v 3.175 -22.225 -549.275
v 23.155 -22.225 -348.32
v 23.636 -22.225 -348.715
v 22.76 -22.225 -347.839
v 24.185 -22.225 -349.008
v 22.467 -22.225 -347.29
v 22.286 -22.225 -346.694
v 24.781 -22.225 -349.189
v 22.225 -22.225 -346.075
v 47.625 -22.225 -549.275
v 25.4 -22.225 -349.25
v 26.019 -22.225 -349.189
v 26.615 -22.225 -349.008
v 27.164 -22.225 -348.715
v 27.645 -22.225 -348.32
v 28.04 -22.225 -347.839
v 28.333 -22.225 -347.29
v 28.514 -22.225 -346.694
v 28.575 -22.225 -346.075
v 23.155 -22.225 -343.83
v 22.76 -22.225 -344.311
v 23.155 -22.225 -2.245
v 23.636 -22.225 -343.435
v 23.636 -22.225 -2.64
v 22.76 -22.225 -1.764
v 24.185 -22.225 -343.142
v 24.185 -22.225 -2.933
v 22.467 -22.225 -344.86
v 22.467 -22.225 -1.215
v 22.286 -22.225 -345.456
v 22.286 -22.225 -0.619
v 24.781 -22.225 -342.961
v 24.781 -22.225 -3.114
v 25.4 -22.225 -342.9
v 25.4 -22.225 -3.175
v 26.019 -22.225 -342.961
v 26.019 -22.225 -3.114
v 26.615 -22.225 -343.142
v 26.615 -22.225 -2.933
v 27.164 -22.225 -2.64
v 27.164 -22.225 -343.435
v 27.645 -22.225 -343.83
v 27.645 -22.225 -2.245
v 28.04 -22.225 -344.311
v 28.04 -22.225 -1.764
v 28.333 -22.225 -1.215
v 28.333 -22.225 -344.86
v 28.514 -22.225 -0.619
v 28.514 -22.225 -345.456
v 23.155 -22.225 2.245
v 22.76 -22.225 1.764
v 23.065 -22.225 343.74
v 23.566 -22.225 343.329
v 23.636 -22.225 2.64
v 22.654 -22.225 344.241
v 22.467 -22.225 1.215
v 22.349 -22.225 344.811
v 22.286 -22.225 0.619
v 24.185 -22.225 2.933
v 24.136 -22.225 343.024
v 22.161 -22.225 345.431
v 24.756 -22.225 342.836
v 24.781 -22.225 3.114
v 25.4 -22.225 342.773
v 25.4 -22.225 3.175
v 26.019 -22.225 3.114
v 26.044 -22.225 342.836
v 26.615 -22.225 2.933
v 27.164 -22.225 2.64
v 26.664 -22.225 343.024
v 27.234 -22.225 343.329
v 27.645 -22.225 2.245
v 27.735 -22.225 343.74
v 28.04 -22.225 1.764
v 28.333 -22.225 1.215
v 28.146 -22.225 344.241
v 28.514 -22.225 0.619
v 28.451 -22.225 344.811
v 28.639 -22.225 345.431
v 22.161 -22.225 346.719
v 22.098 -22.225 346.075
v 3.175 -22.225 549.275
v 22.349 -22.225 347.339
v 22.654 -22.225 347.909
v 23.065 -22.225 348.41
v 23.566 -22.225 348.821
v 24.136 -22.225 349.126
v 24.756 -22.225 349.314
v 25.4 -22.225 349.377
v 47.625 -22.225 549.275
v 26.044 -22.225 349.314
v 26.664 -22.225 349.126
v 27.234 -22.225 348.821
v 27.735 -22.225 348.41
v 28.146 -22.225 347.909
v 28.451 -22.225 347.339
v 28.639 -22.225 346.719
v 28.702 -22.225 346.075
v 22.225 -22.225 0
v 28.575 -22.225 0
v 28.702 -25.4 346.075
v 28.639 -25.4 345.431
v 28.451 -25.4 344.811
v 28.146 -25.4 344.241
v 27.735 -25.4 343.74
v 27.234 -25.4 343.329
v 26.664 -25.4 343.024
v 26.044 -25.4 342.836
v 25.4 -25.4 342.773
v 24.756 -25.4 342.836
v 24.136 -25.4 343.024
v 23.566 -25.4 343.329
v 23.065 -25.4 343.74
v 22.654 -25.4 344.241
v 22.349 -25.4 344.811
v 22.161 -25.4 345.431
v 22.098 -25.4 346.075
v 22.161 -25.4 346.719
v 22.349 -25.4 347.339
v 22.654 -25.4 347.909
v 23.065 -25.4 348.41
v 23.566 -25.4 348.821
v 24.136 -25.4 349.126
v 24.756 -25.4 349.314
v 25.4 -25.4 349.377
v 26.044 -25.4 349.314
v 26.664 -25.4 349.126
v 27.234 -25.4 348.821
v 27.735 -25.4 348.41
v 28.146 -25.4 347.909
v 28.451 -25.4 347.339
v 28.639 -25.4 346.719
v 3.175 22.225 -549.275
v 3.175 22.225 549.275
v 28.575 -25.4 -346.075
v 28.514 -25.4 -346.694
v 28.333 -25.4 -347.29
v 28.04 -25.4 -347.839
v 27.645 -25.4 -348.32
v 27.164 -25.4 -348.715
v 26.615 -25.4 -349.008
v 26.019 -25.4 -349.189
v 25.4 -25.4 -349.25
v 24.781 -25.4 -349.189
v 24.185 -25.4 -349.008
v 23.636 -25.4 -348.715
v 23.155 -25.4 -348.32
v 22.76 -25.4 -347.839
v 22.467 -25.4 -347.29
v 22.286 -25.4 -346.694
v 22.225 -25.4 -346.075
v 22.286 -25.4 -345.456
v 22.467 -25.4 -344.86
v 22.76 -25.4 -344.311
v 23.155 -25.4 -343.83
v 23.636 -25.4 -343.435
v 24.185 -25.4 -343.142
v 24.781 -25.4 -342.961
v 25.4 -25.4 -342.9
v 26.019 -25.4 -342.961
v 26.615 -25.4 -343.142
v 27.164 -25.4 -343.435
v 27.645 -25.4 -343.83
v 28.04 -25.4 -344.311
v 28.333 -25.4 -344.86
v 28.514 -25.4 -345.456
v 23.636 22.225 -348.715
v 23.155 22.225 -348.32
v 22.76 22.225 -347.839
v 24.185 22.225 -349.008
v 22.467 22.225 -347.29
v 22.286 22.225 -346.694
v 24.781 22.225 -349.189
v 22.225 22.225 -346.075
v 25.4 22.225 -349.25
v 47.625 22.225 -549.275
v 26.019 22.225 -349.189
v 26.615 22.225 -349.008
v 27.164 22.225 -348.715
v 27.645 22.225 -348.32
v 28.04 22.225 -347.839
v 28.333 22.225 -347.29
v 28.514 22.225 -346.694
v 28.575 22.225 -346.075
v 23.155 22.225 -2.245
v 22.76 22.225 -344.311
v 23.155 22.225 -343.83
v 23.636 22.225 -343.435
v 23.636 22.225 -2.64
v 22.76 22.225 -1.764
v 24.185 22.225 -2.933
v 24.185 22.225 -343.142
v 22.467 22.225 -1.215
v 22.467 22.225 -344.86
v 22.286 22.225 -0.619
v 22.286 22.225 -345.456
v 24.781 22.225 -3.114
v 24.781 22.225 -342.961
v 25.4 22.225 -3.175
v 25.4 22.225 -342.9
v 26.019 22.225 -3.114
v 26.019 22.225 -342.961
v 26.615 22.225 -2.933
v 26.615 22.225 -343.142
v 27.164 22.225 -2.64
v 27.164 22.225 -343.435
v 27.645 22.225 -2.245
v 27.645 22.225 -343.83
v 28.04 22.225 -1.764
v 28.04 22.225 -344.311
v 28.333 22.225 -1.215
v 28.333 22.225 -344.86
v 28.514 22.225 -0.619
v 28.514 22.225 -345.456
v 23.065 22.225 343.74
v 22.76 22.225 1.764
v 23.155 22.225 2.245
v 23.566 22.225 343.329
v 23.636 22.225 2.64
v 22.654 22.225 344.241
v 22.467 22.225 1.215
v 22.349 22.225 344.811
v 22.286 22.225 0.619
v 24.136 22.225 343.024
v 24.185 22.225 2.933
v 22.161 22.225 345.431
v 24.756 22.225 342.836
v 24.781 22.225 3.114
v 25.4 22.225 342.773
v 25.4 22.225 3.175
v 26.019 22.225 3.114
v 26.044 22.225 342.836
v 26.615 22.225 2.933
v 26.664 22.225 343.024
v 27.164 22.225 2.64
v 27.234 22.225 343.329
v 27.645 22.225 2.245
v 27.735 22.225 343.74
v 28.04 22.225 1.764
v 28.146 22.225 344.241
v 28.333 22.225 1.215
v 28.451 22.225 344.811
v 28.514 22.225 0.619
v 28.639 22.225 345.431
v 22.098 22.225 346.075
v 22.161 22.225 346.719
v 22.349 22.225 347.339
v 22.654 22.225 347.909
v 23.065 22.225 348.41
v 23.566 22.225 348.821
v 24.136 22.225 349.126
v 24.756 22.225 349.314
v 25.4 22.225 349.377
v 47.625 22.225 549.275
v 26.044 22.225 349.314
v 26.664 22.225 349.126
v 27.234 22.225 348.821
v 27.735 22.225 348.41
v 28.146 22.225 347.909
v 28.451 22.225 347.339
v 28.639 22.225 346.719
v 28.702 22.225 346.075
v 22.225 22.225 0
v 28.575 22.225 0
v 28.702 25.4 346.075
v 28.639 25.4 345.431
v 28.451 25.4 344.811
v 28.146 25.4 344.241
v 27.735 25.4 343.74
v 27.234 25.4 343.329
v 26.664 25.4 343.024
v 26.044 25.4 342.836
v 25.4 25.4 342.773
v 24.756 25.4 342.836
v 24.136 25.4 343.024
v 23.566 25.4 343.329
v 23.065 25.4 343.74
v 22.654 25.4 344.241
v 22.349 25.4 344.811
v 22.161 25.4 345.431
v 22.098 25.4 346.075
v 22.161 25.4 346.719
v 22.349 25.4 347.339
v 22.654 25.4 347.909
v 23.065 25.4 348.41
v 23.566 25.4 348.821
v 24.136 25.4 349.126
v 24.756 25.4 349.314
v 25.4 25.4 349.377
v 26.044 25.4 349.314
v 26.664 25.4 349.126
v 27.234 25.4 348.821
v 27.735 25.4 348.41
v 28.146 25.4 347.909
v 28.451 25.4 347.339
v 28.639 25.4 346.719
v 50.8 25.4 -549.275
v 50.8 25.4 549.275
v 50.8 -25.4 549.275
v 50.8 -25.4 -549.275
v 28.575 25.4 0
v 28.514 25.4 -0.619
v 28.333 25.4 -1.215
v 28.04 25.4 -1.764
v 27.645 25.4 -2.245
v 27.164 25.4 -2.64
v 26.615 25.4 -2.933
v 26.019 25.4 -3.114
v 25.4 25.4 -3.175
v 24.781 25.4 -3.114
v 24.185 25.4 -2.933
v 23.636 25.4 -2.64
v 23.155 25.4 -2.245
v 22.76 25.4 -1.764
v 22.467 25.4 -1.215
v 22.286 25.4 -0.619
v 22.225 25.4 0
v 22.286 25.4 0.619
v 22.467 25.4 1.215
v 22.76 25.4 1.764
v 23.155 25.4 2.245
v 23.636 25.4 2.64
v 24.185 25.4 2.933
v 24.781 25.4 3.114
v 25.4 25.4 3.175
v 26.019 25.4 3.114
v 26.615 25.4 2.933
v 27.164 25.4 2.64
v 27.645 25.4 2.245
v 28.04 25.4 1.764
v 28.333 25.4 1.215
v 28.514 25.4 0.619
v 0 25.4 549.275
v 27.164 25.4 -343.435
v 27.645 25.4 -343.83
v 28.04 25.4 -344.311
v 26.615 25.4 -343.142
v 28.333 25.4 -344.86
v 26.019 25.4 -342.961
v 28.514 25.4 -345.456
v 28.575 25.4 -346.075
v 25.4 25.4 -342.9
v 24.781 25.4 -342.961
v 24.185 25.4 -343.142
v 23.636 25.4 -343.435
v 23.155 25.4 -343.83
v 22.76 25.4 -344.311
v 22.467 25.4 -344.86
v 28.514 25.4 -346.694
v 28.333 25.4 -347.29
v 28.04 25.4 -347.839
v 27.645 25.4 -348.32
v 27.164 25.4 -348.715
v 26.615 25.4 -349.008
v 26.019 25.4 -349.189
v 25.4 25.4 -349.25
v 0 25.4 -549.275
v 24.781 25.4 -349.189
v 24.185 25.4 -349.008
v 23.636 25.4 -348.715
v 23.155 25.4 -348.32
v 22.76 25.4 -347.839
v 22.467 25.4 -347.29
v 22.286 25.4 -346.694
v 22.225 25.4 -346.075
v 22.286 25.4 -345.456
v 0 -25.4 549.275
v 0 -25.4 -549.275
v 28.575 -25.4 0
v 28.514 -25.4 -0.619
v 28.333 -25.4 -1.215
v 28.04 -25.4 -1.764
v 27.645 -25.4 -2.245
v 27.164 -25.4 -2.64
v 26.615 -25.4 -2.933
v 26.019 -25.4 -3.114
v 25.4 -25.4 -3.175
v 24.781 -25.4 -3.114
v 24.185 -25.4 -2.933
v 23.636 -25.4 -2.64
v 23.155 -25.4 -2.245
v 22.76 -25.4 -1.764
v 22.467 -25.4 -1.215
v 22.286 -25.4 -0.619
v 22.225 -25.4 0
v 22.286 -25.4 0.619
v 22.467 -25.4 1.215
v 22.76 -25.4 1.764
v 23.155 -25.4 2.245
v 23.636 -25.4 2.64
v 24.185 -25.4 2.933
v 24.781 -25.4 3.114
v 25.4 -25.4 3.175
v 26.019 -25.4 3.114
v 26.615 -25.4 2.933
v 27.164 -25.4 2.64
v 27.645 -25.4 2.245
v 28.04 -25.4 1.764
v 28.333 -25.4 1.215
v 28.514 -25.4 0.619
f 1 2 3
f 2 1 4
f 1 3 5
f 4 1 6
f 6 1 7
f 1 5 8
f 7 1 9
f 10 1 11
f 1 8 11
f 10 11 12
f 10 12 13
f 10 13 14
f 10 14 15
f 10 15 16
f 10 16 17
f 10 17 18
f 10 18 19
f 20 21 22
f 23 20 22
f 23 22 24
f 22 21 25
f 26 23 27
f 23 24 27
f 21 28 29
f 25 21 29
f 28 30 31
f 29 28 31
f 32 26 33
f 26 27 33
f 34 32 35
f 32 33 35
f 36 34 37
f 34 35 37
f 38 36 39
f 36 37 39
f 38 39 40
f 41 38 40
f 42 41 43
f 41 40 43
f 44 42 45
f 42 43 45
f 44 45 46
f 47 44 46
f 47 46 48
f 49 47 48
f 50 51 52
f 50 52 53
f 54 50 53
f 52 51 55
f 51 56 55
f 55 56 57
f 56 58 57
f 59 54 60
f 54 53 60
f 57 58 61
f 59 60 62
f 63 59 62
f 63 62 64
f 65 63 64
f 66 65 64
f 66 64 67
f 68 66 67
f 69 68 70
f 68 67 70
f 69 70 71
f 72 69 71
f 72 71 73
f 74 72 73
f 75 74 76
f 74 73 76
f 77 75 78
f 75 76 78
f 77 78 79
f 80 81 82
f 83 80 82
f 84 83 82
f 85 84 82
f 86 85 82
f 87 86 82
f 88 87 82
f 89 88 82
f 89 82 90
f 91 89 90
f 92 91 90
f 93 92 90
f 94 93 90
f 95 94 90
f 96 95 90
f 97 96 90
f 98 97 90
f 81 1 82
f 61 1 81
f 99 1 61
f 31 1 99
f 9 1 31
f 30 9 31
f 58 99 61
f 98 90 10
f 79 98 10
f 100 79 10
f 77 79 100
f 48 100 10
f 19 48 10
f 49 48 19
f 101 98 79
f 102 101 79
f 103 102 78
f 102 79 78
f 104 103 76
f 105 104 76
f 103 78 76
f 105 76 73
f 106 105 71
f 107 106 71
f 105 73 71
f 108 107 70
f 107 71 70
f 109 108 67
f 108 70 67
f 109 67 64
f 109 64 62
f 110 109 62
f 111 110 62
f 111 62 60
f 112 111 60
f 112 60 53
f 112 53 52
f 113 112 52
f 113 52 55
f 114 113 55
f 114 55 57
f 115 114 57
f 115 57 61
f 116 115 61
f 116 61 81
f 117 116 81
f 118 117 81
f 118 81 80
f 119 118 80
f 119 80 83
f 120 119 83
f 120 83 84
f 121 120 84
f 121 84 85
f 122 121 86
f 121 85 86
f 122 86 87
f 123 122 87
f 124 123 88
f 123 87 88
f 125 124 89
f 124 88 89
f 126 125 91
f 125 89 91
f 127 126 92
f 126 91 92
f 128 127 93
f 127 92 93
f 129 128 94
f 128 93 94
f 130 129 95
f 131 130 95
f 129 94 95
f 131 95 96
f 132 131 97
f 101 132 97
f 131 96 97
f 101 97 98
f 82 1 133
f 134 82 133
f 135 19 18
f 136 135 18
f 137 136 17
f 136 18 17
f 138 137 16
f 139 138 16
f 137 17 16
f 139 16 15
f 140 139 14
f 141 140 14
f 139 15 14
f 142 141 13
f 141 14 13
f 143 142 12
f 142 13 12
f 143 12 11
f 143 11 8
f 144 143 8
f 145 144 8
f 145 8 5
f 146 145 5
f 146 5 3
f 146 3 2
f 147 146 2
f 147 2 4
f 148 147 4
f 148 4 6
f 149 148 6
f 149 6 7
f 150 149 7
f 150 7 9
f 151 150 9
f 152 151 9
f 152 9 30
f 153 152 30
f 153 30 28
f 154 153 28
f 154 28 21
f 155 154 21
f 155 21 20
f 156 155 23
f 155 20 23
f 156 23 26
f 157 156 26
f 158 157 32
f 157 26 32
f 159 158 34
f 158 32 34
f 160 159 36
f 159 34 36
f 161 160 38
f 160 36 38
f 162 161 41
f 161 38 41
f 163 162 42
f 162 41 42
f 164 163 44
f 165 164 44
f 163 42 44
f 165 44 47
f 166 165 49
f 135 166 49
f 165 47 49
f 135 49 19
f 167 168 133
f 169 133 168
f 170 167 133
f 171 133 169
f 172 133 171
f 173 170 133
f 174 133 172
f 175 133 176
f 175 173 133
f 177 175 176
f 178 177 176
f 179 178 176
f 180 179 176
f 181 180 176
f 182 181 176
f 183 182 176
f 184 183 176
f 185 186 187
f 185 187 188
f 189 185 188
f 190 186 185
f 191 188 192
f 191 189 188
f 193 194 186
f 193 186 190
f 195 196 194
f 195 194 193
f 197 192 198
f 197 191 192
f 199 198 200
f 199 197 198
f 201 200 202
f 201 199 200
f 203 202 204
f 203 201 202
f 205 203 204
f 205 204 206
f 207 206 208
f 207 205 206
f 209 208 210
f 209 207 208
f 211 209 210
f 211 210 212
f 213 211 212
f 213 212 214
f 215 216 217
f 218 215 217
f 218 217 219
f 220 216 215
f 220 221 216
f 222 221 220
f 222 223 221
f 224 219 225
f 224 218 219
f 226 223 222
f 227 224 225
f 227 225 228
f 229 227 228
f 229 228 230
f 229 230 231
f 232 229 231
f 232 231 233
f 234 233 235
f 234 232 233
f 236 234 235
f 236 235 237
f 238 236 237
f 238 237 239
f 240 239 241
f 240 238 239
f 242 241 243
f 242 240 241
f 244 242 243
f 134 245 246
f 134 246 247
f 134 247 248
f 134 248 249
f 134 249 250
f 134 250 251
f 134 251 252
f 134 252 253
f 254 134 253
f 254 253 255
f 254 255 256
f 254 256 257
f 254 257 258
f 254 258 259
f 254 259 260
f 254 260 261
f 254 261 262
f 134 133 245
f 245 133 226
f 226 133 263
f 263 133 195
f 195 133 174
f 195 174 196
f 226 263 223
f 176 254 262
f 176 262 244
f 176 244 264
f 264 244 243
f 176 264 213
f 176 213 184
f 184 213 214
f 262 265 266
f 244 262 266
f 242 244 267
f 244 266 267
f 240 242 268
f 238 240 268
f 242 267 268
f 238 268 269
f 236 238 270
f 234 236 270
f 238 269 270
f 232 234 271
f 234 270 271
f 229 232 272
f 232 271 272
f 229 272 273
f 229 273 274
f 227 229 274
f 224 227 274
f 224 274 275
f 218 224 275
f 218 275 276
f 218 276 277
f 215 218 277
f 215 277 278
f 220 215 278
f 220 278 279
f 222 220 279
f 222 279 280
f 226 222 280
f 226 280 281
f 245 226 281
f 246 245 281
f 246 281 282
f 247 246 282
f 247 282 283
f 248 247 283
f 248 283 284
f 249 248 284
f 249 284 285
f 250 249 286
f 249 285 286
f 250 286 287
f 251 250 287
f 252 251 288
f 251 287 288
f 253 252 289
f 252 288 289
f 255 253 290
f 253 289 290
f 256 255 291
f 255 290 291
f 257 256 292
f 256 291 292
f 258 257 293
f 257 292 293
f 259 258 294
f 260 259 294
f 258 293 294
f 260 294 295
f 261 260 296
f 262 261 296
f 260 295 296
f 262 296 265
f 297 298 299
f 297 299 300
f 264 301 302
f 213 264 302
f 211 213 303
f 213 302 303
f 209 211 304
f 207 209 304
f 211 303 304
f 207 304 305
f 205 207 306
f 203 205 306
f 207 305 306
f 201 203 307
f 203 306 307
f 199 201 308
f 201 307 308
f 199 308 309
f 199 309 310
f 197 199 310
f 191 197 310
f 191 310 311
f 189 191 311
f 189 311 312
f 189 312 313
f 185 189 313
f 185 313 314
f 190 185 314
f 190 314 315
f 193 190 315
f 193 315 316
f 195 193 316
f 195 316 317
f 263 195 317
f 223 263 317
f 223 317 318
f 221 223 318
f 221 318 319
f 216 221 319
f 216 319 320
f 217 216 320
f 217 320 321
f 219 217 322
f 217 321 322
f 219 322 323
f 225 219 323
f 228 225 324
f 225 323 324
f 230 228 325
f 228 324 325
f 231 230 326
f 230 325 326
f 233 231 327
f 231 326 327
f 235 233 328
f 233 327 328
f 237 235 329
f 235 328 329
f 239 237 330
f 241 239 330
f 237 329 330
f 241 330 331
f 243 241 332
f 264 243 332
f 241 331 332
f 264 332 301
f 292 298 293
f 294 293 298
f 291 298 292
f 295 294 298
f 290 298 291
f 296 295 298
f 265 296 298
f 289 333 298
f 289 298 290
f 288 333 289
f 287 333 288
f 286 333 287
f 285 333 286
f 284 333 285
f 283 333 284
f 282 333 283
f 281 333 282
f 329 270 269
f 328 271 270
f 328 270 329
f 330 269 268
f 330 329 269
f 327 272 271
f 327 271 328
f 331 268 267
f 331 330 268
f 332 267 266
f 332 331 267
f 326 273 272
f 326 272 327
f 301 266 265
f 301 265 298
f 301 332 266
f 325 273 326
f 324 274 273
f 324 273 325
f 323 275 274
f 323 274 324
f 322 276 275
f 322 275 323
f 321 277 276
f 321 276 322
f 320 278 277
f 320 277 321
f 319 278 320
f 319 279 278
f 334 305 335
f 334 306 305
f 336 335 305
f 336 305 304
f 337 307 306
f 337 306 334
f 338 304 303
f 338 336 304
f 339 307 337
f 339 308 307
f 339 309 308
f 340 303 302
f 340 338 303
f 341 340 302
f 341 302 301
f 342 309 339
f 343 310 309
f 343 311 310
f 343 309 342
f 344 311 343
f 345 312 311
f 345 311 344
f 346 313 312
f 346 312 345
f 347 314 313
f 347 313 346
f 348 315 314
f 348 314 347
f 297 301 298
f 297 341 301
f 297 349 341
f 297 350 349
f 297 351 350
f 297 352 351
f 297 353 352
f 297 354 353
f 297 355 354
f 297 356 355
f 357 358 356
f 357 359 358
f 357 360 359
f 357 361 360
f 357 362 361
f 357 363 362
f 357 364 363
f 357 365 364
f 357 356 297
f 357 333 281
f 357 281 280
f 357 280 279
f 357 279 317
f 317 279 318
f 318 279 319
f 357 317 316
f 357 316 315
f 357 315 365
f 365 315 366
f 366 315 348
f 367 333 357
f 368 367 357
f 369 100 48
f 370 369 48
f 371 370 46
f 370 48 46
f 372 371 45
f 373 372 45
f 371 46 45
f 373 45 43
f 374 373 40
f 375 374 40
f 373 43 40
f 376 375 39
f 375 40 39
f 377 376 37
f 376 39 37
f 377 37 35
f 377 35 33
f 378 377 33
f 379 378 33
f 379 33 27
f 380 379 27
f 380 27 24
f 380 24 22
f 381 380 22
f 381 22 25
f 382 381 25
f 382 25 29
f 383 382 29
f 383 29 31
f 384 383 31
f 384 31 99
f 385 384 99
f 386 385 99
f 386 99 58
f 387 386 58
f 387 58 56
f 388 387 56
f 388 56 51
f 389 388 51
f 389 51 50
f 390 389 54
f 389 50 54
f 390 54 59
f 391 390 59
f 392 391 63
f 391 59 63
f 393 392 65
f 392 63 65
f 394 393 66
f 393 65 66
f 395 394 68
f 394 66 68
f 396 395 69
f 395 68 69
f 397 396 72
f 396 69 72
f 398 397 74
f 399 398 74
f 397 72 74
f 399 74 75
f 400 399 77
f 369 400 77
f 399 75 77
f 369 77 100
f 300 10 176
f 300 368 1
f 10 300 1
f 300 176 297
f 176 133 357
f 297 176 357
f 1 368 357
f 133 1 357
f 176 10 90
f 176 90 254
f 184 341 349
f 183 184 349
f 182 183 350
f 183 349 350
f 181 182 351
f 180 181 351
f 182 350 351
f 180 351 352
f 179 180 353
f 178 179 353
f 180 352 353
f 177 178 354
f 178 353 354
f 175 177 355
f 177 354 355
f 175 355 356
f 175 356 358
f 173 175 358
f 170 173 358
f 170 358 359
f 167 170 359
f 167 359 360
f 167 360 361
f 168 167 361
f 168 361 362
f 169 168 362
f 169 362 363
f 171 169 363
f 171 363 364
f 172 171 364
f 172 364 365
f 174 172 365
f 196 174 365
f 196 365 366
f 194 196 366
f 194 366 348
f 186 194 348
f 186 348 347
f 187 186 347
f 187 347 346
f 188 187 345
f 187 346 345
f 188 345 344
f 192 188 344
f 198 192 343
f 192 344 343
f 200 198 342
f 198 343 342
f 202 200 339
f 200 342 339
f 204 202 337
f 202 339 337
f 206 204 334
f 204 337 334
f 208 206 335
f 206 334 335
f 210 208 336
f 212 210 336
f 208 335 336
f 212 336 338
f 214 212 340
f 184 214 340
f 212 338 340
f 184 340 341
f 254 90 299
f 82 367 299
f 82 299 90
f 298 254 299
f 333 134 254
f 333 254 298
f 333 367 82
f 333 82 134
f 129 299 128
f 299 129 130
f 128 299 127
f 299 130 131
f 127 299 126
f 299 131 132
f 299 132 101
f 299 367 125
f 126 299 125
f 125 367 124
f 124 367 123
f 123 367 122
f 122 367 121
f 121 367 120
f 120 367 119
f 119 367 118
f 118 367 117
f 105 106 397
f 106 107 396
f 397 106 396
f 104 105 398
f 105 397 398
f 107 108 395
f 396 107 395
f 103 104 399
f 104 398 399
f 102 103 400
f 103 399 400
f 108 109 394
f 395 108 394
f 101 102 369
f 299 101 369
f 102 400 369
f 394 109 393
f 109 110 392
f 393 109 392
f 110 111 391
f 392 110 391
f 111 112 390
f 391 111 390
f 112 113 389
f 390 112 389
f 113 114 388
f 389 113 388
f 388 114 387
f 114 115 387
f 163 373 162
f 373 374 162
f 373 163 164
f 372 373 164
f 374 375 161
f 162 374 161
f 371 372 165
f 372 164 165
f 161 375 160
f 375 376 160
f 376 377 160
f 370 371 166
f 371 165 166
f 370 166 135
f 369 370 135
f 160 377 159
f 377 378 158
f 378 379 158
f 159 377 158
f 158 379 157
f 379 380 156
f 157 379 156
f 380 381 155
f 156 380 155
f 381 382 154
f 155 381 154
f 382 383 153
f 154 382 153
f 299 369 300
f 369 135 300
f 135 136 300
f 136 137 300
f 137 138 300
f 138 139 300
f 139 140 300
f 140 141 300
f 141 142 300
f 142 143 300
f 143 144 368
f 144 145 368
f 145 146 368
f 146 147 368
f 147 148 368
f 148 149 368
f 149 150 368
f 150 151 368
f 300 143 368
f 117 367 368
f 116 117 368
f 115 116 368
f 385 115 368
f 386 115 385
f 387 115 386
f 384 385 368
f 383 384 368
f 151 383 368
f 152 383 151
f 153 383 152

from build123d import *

# Parameters (mm, degrees)
SKETCH1_W           = 1098.55
SKETCH1_H           = 50.8
BOSS_EXTRUDE1_DEPTH = 50.8
SKETCH2_W           = 44.45
SKETCH2_H           = 44.45
CUT_EXTRUDE1_DEPTH  = 1099.55
SKETCH5_R           = 3.302
SKETCH5_R_2         = 3.175
CUT_EXTRUDE2_DEPTH  = 50.8


with BuildPart() as part:
    # Sketch1 → Boss-Extrude1 (new body)
    with BuildSketch(Plane(origin=(0, 0, 0), x_dir=(0, 0, -1), z_dir=(1, 0, 0))):
        Rectangle(SKETCH1_W, SKETCH1_H)
    extrude(amount=BOSS_EXTRUDE1_DEPTH)

    # Sketch2 → Cut-Extrude1 (cut, through all)
    with BuildSketch(Plane.XY.offset(549.275)):
        with Locations((25.4, 0)):
            Rectangle(SKETCH2_W, SKETCH2_H)
    extrude(amount=-CUT_EXTRUDE1_DEPTH, mode=Mode.SUBTRACT)

    # Sketch5 → Cut-Extrude2 (cut)
    with BuildSketch(Plane(origin=(0, 25.4, 0), x_dir=(1, 0, 0), z_dir=(0, 1, 0))):
        with Locations((25.4, -346.075)):
            Circle(SKETCH5_R)
        with Locations((25.4, 0)):
            Circle(SKETCH5_R_2)
        with Locations((25.4, 346.075)):
            Circle(SKETCH5_R_2)
    extrude(amount=-CUT_EXTRUDE2_DEPTH, mode=Mode.SUBTRACT)


solid = part.part
